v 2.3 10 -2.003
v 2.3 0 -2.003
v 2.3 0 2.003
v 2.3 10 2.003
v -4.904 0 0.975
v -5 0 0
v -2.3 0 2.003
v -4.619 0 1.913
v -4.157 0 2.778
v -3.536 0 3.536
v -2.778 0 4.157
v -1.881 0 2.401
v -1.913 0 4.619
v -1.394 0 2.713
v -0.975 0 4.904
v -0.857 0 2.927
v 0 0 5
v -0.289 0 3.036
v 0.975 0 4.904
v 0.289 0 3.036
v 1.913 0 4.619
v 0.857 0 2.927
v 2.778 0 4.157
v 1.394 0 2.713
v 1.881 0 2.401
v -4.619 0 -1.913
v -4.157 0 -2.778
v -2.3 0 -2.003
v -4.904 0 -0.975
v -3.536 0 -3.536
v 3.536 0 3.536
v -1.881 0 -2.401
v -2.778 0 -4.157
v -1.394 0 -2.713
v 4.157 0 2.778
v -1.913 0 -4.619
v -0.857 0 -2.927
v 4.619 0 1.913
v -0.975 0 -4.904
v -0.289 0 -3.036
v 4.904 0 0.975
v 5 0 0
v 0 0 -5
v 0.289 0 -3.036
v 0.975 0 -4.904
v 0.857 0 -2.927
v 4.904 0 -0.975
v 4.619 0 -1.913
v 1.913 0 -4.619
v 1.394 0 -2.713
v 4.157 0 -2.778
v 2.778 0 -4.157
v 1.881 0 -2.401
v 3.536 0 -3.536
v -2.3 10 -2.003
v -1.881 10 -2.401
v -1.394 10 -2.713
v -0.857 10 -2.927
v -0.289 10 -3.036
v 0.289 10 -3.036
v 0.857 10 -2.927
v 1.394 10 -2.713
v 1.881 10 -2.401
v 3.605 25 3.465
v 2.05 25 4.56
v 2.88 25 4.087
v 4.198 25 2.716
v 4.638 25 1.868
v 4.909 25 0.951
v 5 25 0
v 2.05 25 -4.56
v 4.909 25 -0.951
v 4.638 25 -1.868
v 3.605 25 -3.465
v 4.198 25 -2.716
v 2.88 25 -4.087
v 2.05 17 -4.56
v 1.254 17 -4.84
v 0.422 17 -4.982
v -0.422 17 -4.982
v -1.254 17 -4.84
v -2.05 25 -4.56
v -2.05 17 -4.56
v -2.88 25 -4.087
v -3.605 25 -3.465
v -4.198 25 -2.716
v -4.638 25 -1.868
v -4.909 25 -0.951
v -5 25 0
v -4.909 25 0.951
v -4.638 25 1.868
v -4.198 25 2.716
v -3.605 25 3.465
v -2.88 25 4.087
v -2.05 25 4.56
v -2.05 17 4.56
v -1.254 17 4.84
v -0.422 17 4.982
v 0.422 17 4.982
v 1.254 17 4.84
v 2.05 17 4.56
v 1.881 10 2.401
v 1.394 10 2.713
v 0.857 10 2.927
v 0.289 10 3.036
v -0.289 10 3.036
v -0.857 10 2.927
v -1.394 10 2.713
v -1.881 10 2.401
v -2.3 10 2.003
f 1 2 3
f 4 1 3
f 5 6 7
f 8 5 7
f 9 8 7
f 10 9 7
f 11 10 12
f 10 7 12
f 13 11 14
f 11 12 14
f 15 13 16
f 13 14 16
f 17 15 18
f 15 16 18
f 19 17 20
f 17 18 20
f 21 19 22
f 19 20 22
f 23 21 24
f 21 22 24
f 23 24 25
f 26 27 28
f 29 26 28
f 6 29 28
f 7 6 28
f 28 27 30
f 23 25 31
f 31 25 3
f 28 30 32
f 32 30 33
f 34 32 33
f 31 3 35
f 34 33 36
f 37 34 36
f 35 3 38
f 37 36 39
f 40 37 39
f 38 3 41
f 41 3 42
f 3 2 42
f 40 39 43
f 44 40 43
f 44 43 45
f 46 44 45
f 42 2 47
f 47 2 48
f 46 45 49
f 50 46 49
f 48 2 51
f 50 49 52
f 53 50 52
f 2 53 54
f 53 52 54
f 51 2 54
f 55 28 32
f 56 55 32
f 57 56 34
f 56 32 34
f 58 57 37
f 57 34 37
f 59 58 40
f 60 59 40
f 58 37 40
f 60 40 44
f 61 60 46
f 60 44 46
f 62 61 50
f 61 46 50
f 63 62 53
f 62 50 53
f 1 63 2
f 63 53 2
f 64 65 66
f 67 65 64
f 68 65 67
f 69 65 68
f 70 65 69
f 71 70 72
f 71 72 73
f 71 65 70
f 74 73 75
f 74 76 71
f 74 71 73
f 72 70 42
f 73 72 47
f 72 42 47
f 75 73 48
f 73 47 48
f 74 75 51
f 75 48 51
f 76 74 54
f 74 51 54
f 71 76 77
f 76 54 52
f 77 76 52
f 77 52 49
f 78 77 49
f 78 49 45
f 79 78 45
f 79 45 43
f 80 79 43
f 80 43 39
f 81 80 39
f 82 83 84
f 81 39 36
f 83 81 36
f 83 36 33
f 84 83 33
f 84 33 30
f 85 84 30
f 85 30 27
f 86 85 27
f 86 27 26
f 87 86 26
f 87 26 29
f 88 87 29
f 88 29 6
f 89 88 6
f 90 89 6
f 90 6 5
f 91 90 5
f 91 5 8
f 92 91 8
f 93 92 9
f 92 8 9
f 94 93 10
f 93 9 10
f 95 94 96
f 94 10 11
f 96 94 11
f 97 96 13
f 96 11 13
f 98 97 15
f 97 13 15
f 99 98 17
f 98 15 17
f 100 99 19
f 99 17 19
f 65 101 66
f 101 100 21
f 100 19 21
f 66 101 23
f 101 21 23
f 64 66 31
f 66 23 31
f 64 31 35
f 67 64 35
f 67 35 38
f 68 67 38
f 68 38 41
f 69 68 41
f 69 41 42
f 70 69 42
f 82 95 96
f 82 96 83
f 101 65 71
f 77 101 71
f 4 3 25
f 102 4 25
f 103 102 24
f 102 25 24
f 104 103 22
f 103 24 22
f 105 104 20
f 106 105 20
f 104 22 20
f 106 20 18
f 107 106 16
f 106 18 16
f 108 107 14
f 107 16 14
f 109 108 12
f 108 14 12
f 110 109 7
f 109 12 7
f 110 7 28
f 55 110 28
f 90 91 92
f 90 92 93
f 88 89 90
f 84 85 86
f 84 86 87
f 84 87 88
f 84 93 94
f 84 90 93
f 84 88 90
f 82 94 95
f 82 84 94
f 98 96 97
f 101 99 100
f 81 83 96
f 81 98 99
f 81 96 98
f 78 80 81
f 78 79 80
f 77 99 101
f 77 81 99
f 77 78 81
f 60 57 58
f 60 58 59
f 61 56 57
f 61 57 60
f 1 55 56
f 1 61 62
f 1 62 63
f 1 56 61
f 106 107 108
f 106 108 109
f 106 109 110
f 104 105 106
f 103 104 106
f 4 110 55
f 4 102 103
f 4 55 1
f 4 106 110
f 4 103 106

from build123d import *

# Parameters (mm, degrees)
BOSS_EXTRUDE1_OUTLINE_R = 5
BOSS_EXTRUDE1_DEPTH     = 25
SKETCH3_W               = 4.1
SKETCH3_H               = 10.495866356
CUT_EXTRUDE1_DEPTH      = 8
CUT_EXTRUDE2_DEPTH      = 10


# Read off the part's stored shape, not the designer's step: Boss-Extrude1
with BuildPart() as part:
    # Boss-Extrude1 outline → Boss-Extrude1 (new body)
    with BuildSketch(Plane(origin=(0, 0, 0), x_dir=(1, 0, 0), z_dir=(0, 1, 0))):
        Circle(BOSS_EXTRUDE1_OUTLINE_R)
    extrude(amount=BOSS_EXTRUDE1_DEPTH)

    # Sketch3 → Cut-Extrude1 (cut)
    with BuildSketch(Plane(origin=(0, 25, 0), x_dir=(1, 0, 0), z_dir=(0, 1, 0))):
        Rectangle(SKETCH3_W, SKETCH3_H)
    extrude(amount=-CUT_EXTRUDE1_DEPTH, mode=Mode.SUBTRACT)

    # Sketch2 → Cut-Extrude2 (cut)
    with BuildSketch(Plane.XZ):
        with BuildLine():
            Line((-2.3, 2.003122562), (-2.3, -2.003122562))
            ThreePointArc((-2.3, -2.003122562), (0, -3.05), (2.3, -2.003122562))
            Line((2.3, -2.003122562), (2.3, 2.003122562))
            ThreePointArc((2.3, 2.003122562), (0, 3.05), (-2.3, 2.003122562))
        make_face()
    extrude(amount=-CUT_EXTRUDE2_DEPTH, mode=Mode.SUBTRACT)


solid = part.part
